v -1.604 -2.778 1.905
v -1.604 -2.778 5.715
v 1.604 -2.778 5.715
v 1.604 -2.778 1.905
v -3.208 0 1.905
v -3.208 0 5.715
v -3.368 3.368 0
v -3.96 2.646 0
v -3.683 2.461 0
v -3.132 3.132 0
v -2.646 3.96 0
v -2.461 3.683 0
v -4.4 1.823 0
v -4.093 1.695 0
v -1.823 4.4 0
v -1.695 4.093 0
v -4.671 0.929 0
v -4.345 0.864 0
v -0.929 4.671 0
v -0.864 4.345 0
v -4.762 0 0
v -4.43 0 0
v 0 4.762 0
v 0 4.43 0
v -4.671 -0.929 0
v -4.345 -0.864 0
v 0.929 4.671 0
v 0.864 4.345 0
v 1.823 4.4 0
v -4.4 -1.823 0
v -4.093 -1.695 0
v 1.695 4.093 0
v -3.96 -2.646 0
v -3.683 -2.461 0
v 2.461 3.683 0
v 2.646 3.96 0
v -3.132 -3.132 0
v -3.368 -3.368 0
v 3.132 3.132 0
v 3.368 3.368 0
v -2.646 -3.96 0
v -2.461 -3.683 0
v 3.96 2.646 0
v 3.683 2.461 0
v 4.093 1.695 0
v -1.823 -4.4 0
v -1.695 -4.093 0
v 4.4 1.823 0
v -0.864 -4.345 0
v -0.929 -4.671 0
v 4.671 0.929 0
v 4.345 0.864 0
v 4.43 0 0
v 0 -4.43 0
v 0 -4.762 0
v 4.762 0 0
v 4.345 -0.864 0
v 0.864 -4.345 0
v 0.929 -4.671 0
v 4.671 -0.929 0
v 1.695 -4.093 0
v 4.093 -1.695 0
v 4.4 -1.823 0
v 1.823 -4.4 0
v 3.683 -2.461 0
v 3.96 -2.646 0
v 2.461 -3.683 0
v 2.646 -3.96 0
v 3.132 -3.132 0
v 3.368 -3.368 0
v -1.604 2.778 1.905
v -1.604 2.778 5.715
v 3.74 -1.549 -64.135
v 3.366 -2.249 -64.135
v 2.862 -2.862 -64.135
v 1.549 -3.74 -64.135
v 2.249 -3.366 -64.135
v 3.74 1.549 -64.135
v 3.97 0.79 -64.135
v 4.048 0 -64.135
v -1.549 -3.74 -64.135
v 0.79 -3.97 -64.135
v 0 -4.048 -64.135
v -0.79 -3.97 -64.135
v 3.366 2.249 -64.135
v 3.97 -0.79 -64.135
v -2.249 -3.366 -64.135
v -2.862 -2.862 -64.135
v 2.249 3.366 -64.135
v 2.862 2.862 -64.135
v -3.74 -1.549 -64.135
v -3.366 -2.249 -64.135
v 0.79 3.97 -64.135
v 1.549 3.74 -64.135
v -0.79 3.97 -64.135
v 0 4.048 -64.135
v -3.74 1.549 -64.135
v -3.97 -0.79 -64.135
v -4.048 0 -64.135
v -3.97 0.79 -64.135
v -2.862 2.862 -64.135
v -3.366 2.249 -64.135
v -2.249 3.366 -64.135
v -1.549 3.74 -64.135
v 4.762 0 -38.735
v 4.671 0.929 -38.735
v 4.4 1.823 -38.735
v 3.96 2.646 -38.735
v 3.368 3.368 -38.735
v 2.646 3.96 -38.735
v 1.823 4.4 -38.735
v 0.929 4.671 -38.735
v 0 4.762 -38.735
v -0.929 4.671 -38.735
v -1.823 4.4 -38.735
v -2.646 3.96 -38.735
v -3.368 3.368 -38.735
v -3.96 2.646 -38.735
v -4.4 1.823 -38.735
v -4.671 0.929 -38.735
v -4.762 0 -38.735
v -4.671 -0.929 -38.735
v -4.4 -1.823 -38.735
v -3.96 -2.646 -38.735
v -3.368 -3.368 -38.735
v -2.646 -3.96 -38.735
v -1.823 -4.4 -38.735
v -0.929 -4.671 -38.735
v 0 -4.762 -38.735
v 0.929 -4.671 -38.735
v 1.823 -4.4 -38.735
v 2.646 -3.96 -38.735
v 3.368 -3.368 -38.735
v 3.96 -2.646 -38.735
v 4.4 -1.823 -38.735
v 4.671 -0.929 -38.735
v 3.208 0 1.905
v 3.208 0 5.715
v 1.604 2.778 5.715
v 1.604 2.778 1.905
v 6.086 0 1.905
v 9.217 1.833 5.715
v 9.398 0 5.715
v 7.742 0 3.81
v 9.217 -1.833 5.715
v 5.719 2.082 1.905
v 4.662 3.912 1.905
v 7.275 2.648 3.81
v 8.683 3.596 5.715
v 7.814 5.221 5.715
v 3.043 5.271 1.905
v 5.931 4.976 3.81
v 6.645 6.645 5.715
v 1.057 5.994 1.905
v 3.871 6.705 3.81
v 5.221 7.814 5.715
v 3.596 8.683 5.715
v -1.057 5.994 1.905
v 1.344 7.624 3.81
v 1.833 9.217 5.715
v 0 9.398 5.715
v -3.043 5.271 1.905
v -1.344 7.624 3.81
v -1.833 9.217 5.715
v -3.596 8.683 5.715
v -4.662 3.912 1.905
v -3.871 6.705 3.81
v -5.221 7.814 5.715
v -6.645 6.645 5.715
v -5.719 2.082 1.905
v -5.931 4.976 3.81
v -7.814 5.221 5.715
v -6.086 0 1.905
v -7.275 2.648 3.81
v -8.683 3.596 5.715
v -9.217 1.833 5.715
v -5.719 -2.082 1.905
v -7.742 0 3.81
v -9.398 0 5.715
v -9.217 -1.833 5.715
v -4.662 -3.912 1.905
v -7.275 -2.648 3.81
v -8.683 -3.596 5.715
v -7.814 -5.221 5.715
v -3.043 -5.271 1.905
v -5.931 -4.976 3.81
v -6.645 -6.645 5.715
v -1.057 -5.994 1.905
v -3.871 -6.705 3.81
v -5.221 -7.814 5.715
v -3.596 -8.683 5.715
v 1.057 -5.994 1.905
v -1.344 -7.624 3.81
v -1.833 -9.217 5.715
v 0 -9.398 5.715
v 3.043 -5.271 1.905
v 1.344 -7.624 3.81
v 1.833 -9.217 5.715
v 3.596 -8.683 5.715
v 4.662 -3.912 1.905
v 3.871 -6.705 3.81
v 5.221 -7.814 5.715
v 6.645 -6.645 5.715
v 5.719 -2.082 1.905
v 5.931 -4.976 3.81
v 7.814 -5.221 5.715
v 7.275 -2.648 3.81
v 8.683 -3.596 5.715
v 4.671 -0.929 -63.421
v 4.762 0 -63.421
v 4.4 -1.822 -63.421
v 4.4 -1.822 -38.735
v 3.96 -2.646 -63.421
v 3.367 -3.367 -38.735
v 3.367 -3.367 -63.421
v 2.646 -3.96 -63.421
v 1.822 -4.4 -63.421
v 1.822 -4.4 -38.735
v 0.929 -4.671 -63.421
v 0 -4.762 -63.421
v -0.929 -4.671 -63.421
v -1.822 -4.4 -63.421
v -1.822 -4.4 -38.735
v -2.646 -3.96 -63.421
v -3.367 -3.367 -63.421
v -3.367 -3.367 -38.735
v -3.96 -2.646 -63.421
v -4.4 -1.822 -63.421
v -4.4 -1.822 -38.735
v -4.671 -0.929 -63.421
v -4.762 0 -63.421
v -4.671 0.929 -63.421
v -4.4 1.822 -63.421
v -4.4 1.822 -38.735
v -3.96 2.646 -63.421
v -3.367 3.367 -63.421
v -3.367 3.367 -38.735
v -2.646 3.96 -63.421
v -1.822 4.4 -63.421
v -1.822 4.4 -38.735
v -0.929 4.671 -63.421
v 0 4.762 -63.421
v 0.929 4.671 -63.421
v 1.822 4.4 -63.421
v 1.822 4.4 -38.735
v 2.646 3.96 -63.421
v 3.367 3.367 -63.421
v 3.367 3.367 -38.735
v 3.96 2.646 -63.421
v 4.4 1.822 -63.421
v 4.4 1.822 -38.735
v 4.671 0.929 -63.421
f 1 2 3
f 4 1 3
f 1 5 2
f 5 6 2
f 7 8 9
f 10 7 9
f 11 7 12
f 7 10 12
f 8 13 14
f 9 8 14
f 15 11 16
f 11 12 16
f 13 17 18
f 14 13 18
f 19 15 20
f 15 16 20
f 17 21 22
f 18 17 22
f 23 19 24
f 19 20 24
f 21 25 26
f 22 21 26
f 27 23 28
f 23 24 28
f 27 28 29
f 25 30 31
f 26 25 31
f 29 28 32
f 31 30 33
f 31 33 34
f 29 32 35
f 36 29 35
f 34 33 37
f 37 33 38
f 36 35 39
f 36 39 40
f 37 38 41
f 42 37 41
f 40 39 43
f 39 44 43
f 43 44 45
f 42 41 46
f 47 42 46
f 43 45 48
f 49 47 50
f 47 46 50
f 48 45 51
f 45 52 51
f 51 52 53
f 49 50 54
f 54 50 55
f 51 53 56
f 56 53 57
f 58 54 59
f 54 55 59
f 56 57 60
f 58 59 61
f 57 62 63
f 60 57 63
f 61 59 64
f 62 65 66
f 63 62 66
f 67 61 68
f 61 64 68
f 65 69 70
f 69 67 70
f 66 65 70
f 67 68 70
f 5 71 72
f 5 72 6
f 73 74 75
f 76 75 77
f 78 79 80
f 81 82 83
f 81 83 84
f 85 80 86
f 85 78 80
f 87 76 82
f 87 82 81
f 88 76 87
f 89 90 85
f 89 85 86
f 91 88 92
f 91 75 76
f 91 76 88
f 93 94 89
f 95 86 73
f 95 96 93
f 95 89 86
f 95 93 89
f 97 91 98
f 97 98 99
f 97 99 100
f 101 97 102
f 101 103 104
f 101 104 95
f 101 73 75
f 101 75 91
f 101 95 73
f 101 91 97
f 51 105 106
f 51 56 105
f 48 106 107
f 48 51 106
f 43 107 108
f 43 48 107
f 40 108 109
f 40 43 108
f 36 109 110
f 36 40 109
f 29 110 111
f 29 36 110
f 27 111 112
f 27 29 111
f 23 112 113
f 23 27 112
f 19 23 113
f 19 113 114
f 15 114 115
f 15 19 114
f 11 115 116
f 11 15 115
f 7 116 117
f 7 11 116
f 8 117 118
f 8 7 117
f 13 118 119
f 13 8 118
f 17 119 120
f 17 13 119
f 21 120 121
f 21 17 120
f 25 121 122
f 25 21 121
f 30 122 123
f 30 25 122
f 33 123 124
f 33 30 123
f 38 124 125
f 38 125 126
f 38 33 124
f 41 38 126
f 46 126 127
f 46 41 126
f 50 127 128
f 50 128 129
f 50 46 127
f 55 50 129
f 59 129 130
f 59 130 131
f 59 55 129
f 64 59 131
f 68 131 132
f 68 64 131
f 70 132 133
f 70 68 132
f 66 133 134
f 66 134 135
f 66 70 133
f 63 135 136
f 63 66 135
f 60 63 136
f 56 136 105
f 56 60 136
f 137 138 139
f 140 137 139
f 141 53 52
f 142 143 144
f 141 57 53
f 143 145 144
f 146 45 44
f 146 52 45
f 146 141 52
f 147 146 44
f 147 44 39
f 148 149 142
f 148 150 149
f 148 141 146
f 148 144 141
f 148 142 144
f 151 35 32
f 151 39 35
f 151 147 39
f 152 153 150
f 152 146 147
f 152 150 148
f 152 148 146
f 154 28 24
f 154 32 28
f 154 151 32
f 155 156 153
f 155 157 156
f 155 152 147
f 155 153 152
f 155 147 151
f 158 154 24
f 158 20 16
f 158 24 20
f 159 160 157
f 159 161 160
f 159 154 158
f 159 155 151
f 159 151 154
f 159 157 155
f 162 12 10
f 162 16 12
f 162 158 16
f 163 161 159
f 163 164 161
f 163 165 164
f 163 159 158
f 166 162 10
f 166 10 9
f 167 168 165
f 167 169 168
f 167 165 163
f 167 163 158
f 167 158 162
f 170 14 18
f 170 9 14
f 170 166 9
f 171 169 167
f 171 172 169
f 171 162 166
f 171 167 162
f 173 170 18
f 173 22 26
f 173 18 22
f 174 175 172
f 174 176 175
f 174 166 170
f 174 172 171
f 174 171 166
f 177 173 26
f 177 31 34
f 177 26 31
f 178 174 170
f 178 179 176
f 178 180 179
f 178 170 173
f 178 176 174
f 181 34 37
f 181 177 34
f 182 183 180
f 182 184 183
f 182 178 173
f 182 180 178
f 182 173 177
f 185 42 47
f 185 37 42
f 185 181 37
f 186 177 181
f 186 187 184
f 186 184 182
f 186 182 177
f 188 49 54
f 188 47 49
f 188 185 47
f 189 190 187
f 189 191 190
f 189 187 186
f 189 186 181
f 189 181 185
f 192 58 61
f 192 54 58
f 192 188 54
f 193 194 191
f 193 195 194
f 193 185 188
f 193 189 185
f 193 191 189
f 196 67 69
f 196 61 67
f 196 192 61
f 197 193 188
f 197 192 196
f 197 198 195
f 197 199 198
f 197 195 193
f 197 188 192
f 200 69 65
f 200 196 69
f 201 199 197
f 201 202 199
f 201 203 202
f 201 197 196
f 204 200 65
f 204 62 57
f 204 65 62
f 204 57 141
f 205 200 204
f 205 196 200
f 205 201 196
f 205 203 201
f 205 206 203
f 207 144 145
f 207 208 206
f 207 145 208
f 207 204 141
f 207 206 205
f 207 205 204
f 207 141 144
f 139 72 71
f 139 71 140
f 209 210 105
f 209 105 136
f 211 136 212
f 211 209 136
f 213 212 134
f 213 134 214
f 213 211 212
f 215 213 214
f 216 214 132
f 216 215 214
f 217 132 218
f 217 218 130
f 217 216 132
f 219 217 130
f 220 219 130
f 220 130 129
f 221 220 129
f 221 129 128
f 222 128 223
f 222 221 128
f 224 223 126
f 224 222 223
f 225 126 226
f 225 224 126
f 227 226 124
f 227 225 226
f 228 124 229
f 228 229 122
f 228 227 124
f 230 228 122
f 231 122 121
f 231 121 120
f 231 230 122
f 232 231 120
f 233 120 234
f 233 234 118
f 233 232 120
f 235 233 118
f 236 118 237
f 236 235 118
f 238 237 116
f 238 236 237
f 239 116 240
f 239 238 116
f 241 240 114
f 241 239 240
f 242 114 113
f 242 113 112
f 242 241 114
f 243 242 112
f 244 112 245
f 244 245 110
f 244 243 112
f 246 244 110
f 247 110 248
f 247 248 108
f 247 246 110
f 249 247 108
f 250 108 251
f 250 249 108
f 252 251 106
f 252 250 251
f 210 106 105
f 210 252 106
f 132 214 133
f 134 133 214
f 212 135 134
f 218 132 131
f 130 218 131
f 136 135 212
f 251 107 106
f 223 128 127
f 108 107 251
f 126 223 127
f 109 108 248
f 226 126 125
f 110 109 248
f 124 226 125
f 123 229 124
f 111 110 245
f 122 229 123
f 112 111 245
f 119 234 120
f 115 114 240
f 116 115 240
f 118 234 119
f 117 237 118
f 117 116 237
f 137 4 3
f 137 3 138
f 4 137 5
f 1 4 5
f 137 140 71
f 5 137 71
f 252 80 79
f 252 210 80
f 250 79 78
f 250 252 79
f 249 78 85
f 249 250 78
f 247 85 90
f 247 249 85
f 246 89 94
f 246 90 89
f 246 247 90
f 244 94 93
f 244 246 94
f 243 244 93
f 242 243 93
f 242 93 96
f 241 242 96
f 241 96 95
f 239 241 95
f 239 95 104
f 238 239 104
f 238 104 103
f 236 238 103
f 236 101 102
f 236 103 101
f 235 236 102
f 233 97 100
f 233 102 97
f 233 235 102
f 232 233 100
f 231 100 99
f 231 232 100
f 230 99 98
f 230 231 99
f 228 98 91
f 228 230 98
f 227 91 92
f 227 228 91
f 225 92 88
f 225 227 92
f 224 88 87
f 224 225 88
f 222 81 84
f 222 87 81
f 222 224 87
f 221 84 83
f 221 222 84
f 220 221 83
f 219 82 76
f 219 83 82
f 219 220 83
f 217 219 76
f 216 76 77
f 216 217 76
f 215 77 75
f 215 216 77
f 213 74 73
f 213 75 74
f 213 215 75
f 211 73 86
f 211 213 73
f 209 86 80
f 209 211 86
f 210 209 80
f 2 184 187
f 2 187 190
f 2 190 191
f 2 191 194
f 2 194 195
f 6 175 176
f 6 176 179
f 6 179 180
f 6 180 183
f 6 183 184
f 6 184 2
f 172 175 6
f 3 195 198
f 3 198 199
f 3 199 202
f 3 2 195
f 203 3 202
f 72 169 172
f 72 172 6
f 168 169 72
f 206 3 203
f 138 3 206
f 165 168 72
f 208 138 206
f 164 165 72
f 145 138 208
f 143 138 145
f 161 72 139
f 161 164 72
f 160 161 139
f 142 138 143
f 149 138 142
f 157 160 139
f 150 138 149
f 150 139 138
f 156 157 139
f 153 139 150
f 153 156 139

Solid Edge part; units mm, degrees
sketch "Sketch1" plane through (0, 0, 0) normal (0, 0, 1) x (1, 0, 0)
  circle A0 centre (0, 0) radius 9.398
  dimension "D1" = 18.796
extrude "Protrusion1" add sketch "Sketch1" along normal blind 5.715
sketch "Sketch2" plane through (0, 0, 0) normal (0, 0, -1) x (1, 0, 0)
  circle A0 centre (0, 0) radius 4.7625
extrude "Protrusion2" add sketch "Sketch2" along normal blind 64.135
sketch "Sketch3" plane through (0, 0, -64.135) normal (0, 0, -1) x (1, 0, 0)
  circle A0 centre (0, 0) radius 4.7622
extrude "Cutout1" cut sketch "Sketch3" against normal blind 25.4 flip side to cut
chamfer "Chamfer_1" distance 0.7144 angle 45 1 edges at (-4.7622, 0, -64.135)
sketch "Sketch4" plane through (0, 0, 5.715) normal (0, 0, 1) x (1, 0, 0)
  line L0 (-1.604, 2.7781) -> (1.604, 2.7781)
  line L1 (3.2079, 0) -> (1.604, 2.7781)
  line L2 (1.604, -2.7781) -> (3.2079, 0)
  line L3 (-1.604, -2.7781) -> (1.604, -2.7781)
  line L4 (-3.2079, 0) -> (-1.604, -2.7781)
  line L5 (-1.604, 2.7781) -> (-3.2079, 0)
  dimension "D1" = 5.5562
extrude "Cutout2" cut sketch "Sketch4" against normal blind 3.81
sketch "Sketch5" plane through (0, 0, 0) normal (0, -1, 0) x (1, 0, 0)
  line L0 (9.398, 5.715) -> (4.43, 0)
  line L1 (4.43, 0) -> (9.398, 0)
  line L2 (9.398, 0) -> (9.398, 5.715)
revolve "RevolvedCutout1" cut sketch "Sketch5" angle 360 about axis through (0, 0, 14.0017) along (0, 0, -1)
properties part number "185727" material "Stainless Steel, 304"
